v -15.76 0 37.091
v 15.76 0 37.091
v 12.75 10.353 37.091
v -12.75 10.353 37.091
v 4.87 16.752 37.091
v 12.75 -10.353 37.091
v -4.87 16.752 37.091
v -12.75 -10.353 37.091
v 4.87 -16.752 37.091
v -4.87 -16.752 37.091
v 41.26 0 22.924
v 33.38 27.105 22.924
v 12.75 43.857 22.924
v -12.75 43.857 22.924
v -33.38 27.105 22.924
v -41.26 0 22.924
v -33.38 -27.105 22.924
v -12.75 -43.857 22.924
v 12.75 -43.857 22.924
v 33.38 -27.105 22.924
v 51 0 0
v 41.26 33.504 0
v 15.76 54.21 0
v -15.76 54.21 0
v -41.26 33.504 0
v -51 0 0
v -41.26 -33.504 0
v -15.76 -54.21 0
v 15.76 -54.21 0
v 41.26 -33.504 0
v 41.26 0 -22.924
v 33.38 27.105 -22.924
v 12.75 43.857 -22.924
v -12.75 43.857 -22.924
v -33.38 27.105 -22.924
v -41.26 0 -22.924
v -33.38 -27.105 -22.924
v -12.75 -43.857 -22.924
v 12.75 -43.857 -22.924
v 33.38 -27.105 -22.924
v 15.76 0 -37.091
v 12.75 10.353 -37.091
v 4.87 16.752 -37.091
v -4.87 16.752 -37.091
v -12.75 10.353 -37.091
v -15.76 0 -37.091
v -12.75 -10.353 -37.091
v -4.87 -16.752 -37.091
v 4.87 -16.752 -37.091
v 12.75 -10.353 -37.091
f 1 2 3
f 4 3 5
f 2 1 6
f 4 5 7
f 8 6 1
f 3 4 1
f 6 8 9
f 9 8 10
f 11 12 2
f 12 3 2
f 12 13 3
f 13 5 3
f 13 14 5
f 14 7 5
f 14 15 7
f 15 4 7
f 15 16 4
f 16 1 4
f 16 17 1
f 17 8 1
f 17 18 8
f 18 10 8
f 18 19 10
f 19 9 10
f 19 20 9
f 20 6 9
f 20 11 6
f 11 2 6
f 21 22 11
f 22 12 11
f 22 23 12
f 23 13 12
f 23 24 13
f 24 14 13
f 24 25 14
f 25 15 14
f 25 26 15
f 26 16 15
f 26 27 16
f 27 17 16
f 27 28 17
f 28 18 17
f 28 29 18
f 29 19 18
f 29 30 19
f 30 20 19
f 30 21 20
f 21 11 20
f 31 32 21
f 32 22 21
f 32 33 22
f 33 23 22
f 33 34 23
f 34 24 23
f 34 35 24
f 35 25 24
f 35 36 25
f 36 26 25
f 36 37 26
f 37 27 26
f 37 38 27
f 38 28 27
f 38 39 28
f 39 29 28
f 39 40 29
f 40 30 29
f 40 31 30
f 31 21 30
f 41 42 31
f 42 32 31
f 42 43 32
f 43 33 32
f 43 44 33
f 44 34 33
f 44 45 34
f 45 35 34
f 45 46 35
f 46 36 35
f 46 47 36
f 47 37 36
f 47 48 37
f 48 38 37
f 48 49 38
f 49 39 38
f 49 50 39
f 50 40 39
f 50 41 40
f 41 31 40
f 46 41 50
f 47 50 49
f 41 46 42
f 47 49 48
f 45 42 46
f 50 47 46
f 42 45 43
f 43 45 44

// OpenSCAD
// Generated by SolidPython 1.0.1 on 2020-07-29 00:46:53


scale(v = [17, 19, 13]) {
	sphere(r = 3);
}
/***********************************************
*********      SolidPython code:      **********
************************************************
 
# import packages: SolidPython
from solid import *
from solid.utils import *
from itertools import chain, combinations, permutations


class Resize:

    def __init__(self, scad_file):
        self.scad_file = scad_file
        #self.scad_file = import_scad(scad_file)
        # cone/cylinder param:
        self.r1 = 0
        self.r2 = 0
        self.h = 0
        # rectangular prism param:
        self.w = 0
        self.l = 0
        # ellipse param:
        self.r = 0

    # import OpenScad code (file name corresponds to shape)


    # classify shape + parameters
    def assign(self, param1, param2, param3):
        if self.scad_file == 'cone.scad':
            self.r1 = param1
            self.r2 = param2
            self.h = param3
        elif self.scad_file == 'cylinder.scad':
            self.r1 = param1
            self.r2 = param2
            self.h = param3
        elif self.scad_file == 'rectangularPrism.scad':
            self.h = param1
            self.l = param2
            self.w = param3
        else:
            self.r = param1
            self.h = param2

    # resize parameters
    def iterate(self):
        x = range(3, 20, 2)
        i = 1
        if self.scad_file == 'cone.scad':
            tempList = list(permutations(x, 2))
            for temp in tempList:
                param1 = temp[0]
                param2 = temp[1]
                filepath = 'produced_scad_files/' + 'cone' + str(param1) + '_' + str(param2) + '_' + '.scad'
                scad_render_to_file(cylinder(h=param1, r1=param2, r2=0), filepath)

        elif self.scad_file == 'cylinder.scad':
            tempList = list(permutations(x, 3))
            for temp in tempList:
                param1 = temp[0]
                param2 = temp[1]
                filepath = 'produced_scad_files/' + 'cylinder' + str(param1) + '_' + str(param2) + '_' + '.scad'
                scad_render_to_file(cylinder(h=param1, r1=param2, r2=param2), filepath)

        elif self.scad_file == 'rectangularPrism.scad':
            tempList = list(permutations(x, 3))
            for temp in tempList:
                param1 = temp[0]
                param2 = temp[1]
                param3 = temp[2]
                filepath = 'produced_scad_files/' + 'rectangularPrism' + str(param1) + '_' + str(param2) + '_' + str(
                    param3) + '.scad'
                scad_render_to_file(cube(size=(param1, param2, param3)), filepath)

        elif self.scad_file == 'ellipse.scad':
            tempList = list(permutations(x, 4))
            for temp in tempList:
                param1 = temp[0]
                param2 = temp[1]
                param3 = temp[2]
                param4 = temp[3]
                filepath = 'produced_scad_files/' + 'ellipse' + str(param1) + '_' + str(param2) + '_' + str(param3) + '_' + str(param4) + '.scad'
                scad_render_to_file(scale([param1, param2, param3])(sphere(r=param4)), filepath)

    def render_to_scadfile(self):
        scad_render_to_file(scad, 'example.scad') 
 
************************************************/
